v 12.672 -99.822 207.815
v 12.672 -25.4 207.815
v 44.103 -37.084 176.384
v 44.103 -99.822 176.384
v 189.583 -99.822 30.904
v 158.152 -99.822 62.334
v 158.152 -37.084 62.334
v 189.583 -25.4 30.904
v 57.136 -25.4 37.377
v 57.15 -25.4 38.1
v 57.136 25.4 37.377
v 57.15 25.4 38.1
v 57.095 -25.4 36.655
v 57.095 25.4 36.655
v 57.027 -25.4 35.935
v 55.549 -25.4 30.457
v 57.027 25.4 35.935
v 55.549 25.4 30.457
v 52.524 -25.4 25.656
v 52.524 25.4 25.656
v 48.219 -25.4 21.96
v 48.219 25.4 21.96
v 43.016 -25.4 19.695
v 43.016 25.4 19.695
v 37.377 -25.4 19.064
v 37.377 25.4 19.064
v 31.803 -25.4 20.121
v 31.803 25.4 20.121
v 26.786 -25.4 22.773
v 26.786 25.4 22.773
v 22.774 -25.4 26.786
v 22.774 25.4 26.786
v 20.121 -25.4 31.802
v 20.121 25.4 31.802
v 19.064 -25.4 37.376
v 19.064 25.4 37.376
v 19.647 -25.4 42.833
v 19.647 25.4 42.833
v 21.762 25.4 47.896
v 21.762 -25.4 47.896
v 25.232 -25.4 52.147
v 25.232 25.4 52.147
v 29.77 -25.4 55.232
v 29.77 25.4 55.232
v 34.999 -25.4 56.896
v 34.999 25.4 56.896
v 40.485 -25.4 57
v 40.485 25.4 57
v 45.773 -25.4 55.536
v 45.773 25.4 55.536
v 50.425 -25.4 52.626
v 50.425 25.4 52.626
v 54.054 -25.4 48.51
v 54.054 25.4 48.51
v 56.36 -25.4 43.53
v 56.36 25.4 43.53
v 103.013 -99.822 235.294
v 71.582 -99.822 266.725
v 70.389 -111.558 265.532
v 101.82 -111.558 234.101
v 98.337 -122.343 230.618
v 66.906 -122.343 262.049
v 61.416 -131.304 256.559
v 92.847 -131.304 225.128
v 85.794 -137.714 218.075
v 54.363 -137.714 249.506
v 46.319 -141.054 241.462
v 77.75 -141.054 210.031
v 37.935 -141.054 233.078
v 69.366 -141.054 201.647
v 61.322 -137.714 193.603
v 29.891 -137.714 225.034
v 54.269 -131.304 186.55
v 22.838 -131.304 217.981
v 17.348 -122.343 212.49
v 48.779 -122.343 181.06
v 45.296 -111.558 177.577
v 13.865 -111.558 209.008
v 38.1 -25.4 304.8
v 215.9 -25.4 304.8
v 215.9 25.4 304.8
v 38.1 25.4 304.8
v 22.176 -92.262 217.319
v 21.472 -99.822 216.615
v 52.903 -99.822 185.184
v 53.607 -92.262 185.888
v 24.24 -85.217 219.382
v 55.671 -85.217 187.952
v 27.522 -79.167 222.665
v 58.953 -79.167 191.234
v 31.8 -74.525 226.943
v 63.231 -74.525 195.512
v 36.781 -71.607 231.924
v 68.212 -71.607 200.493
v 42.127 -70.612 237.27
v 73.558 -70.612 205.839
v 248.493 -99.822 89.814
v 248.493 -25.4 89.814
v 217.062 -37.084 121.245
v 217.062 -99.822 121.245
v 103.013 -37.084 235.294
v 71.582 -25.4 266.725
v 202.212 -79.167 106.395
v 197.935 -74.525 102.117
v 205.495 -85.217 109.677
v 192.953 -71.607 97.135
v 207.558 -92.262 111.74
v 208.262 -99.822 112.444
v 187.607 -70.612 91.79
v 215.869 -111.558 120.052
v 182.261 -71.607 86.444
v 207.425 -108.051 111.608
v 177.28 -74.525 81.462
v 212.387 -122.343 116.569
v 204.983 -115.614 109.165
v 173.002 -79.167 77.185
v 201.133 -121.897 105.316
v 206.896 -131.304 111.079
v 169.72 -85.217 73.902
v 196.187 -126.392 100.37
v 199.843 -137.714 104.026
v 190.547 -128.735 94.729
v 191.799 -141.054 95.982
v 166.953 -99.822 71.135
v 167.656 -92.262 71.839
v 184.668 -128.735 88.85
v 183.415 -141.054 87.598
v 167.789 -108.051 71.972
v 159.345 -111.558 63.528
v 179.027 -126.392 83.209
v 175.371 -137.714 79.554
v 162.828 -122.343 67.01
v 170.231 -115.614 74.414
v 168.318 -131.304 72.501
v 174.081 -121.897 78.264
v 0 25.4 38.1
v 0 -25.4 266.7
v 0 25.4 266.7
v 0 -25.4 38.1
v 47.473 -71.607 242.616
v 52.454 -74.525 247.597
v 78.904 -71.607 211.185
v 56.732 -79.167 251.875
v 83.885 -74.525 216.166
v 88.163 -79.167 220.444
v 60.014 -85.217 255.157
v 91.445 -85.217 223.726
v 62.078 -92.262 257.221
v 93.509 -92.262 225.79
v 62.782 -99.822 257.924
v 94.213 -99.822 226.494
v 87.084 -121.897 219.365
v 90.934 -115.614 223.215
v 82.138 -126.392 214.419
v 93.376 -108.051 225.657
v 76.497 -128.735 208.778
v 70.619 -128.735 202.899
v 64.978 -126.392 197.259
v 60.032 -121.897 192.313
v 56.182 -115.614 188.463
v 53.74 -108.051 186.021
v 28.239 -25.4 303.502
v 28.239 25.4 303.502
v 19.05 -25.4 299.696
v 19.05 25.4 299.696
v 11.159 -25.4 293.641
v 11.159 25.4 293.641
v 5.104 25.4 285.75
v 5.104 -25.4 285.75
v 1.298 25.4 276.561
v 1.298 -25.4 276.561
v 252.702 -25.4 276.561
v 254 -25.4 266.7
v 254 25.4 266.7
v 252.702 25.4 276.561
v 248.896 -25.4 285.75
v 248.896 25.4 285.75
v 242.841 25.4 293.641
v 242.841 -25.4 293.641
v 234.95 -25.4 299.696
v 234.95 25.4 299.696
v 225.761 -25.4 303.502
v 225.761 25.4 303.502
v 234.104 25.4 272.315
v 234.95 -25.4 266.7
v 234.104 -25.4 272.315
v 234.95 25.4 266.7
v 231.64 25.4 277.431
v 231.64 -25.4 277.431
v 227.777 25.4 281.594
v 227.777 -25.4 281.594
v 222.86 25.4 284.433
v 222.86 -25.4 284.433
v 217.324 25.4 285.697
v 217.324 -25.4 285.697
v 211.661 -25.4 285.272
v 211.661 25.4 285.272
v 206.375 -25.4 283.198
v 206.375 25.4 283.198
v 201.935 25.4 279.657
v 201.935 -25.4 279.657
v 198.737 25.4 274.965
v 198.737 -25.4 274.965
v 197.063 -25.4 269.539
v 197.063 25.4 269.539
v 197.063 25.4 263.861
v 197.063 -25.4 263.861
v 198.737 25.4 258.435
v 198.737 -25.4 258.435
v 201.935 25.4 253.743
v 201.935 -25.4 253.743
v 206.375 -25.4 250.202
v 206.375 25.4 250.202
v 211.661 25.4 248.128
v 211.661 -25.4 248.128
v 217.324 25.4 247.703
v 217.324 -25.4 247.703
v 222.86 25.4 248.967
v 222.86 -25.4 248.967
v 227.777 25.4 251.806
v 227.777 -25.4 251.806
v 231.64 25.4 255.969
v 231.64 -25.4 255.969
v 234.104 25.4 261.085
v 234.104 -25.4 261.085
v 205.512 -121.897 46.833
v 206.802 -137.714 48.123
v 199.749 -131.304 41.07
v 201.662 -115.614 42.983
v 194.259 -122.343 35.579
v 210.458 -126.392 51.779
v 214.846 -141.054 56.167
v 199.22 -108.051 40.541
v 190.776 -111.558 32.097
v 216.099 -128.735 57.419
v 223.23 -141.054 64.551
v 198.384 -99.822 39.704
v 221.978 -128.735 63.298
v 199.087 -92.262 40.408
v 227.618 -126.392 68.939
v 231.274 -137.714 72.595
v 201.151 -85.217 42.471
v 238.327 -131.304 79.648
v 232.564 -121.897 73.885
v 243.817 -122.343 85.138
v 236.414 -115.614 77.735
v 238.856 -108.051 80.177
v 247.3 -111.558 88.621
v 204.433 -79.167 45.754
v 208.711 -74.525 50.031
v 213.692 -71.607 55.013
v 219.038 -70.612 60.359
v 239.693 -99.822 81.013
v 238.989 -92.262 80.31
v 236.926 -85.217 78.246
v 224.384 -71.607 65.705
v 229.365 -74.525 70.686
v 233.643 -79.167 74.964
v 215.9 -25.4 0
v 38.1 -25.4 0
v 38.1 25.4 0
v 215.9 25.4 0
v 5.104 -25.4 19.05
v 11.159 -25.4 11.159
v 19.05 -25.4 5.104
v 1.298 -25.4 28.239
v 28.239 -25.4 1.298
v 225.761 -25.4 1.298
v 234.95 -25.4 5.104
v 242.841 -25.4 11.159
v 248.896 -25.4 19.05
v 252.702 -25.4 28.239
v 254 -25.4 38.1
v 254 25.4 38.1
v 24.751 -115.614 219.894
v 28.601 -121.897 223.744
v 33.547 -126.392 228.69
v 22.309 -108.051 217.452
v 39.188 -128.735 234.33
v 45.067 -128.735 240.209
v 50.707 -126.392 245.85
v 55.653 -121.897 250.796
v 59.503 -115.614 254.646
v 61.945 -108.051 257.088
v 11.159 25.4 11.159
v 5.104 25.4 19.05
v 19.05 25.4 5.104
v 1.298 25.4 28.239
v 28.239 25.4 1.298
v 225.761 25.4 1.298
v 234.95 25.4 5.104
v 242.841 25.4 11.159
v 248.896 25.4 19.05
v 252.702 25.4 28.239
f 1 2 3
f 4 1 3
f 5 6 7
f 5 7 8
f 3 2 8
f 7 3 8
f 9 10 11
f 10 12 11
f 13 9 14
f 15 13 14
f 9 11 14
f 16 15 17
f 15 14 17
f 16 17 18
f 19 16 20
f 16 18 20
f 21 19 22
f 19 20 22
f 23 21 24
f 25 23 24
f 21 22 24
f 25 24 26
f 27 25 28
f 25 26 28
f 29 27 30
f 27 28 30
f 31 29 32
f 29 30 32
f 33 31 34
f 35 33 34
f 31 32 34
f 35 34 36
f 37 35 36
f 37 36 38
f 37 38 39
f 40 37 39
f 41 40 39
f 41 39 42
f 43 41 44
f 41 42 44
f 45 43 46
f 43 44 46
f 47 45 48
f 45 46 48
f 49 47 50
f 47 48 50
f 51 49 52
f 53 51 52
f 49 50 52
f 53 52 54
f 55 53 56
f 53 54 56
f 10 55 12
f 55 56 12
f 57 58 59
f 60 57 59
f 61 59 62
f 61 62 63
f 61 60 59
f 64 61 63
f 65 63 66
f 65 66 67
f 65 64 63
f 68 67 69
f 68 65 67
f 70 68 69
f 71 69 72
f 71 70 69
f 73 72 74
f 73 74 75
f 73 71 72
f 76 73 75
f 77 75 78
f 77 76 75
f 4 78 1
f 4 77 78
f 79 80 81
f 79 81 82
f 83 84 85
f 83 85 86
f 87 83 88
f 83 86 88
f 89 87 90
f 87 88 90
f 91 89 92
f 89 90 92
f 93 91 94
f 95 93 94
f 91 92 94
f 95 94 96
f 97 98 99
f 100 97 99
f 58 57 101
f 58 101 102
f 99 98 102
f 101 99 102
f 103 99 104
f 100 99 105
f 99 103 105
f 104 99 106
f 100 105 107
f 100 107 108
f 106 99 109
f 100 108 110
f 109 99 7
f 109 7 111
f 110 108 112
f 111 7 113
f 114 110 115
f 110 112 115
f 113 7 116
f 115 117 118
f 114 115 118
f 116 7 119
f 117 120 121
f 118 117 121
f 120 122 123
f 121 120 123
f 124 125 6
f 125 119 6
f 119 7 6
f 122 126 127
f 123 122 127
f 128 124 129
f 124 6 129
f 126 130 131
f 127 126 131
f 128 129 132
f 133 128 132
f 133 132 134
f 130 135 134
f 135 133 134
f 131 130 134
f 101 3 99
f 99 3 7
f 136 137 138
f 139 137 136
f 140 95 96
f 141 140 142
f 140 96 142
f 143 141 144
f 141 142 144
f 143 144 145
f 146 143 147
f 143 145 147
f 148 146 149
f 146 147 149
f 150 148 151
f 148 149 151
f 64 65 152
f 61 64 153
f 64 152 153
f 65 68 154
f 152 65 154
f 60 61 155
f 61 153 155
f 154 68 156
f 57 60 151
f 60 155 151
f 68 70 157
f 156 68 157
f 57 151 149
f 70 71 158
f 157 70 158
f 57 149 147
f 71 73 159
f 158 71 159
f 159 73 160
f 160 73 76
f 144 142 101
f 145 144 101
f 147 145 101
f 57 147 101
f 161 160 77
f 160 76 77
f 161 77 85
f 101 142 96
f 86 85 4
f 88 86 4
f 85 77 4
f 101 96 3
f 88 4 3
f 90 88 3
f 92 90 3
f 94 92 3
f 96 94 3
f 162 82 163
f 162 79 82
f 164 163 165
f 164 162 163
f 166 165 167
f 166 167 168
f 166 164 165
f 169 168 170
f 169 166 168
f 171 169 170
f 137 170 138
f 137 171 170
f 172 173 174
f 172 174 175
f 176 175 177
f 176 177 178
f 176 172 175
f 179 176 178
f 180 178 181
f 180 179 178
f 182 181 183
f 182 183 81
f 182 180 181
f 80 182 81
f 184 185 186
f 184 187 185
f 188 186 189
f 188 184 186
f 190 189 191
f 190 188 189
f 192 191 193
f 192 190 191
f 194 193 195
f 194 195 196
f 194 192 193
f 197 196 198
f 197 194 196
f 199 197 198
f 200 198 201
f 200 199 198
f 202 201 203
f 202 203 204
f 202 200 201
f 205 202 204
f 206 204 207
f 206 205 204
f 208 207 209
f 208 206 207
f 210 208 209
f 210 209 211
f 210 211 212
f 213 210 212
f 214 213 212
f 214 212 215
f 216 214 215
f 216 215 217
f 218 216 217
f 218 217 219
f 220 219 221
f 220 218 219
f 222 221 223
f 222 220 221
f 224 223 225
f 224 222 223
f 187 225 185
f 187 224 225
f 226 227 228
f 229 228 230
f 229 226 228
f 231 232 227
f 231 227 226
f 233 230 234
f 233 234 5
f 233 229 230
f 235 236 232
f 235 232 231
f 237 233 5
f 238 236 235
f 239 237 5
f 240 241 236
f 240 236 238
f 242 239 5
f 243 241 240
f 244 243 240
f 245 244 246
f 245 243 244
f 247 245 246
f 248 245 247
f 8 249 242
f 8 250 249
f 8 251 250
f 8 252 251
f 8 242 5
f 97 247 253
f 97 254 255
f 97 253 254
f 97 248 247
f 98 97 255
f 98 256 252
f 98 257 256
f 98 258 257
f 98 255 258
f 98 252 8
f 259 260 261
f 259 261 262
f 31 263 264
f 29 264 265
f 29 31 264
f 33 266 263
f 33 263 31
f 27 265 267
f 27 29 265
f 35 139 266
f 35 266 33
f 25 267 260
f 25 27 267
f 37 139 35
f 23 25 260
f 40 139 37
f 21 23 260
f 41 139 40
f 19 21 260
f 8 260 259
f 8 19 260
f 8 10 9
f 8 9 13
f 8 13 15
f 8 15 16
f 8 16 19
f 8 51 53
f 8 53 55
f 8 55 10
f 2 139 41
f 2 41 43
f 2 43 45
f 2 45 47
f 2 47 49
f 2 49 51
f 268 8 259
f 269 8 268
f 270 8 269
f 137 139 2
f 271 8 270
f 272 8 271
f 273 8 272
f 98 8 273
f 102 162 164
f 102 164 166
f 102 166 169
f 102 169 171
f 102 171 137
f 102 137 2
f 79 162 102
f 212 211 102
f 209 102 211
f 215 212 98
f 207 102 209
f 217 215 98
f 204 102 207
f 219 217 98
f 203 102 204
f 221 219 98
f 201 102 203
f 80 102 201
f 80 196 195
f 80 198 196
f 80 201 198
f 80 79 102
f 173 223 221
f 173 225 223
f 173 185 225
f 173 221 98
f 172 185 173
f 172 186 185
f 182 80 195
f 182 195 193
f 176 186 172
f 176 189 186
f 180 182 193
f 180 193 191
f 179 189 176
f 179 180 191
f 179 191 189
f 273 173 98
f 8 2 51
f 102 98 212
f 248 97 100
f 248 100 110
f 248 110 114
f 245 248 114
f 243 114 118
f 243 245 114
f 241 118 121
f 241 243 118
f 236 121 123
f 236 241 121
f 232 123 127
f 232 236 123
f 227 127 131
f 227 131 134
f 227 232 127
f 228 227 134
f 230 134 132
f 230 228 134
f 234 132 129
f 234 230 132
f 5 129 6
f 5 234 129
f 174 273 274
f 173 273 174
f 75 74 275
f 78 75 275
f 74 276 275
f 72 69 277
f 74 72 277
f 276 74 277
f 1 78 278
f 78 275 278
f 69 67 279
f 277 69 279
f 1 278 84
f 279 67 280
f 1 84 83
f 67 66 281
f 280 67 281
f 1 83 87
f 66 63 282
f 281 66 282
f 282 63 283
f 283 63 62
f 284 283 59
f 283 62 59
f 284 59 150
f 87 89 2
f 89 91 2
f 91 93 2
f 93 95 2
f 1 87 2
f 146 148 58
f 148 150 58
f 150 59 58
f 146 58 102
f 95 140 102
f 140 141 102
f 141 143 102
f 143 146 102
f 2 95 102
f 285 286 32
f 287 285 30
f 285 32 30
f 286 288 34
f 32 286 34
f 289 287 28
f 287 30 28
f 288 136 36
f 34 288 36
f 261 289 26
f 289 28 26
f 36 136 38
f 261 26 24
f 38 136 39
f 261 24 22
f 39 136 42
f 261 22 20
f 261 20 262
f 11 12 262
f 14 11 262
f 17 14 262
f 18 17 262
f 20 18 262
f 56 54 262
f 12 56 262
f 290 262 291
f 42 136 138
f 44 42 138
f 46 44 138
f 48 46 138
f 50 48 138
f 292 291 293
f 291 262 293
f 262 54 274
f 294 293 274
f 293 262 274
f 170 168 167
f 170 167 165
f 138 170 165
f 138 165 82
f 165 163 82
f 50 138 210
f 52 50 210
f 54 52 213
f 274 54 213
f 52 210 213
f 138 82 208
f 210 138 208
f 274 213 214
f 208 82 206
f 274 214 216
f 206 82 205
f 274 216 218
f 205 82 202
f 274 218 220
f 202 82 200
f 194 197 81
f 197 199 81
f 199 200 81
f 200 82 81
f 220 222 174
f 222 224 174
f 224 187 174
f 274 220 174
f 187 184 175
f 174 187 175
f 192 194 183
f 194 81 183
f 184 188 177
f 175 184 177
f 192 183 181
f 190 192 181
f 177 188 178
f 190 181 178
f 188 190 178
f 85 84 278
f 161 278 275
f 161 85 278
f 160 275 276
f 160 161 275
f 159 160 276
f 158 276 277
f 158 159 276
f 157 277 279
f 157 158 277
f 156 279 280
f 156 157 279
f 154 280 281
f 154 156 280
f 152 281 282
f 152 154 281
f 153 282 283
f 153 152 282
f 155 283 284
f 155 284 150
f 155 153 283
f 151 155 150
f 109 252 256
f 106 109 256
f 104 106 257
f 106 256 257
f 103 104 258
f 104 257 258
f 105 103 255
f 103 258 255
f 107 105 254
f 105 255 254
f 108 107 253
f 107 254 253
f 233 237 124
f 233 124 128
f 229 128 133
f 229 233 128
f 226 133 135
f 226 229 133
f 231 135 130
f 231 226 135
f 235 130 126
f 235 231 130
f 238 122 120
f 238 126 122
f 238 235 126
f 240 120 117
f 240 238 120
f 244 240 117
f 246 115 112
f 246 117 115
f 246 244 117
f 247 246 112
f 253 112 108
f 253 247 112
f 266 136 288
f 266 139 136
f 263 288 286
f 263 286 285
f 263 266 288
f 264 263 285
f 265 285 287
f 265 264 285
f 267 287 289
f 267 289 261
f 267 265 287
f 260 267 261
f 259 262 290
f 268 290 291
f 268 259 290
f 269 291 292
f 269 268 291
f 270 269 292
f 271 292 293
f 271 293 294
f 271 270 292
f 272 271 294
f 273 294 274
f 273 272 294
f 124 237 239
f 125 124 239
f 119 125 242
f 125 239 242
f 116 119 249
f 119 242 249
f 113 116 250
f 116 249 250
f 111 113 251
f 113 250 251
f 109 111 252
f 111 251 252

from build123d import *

# Parameters (mm, degrees)
F0_R     = 19.05
F1_DEPTH = 25.4
F2_DEPTH = 99.822
F4_DEPTH = 250.19
F5_DEPTH = 250.19
F6_W     = 161.29
F6_H     = 62.738
F6_H_2   = 49.2019202976
F7_DEPTH = 171.704


# Not quite as in the source:
# - a feature names something its author has since deleted; it is built from what else it names


with BuildPart() as f1:
    # F0 (on Front) → F1 (new body, symmetric)
    with BuildSketch(Plane.XZ):
        with BuildLine():
            ThreePointArc((0, 38.1), (11.1592316368, 11.1592316368), (38.1, 0))
            Line((38.1, 0), (215.9, 0))
            ThreePointArc((215.9, 0), (242.8407683632, 11.1592316368), (254, 38.1))
            Line((254, 38.1), (254, 266.7))
            ThreePointArc((254, 266.7), (242.8407683632, 293.6407683632), (215.9, 304.8))
            Line((215.9, 304.8), (38.1, 304.8))
            ThreePointArc((38.1, 304.8), (11.1592316368, 293.6407683632), (0, 266.7))
            Line((0, 266.7), (0, 38.1))
        make_face()
        with BuildLine():
            ThreePointArc((57.0266099035, 35.9352973504), (37.3773915988, 19.0637099965), (19.0637495923, 37.376349246))
            ThreePointArc((19.0637495923, 37.376349246), (37.7381093173, 57.1465622918), (57.15, 38.1))
            ThreePointArc((57.15, 38.1), (57.1191274598, 37.0158917631), (57.0266099035, 35.9352973504))
        make_face(mode=Mode.SUBTRACT)
        Polygon((248.4933634432, 89.814005202), (189.582883289, 30.9035250478), (12.671837704, 207.8145706329), (71.5823178582, 266.7250507871), align=None, mode=Mode.SUBTRACT)
        with Locations((215.9, 266.7)):
            Circle(F0_R, mode=Mode.SUBTRACT)
        Polygon((12.671837704, 207.8145706329), (189.582883289, 30.9035250478), (248.4933634432, 89.814005202), (71.5823178582, 266.7250507871), align=None)
    extrude(amount=F1_DEPTH, both=True)

    # F0 (on Front) → F2 (join)
    with BuildSketch(Plane.XZ):
        Polygon((12.671837704, 207.8145706329), (189.582883289, 30.9035250478), (248.4933634432, 89.814005202), (71.5823178582, 266.7250507871), align=None)
    extrude(amount=F2_DEPTH)

    # F3 (on face) → F4 (join)
    with BuildSketch(Plane(origin=(79.3396791206, 0, -79.3396791206), x_dir=(0, 1, 0), z_dir=(0.7071067812, 0, -0.7071067812))):
        with BuildLine():
            ThreePointArc((-99.822, 168.3534344944), (-129.032, 197.5634344944), (-99.822, 226.7734344944))
            Line((-99.822, 226.7734344944), (-99.822, 239.2194344944))
            ThreePointArc((-99.822, 239.2194344944), (-141.478, 197.5634344944), (-99.822, 155.9074344944))
            Line((-99.822, 155.9074344944), (-99.822, 168.3534344944))
        make_face()
    extrude(amount=-F4_DEPTH)

    # F3 (on face) → F5 (cut)
    with BuildSketch(Plane(origin=(79.3396791206, 0, -79.3396791206), x_dir=(0, 1, 0), z_dir=(0.7071067812, 0, -0.7071067812))):
        with BuildLine():
            ThreePointArc((-99.822, 168.3534344944), (-79.1674109215, 176.908845416), (-70.612, 197.5634344944))
            ThreePointArc((-70.612, 197.5634344944), (-79.1674109215, 218.2180235729), (-99.822, 226.7734344944))
            Line((-99.822, 226.7734344944), (-99.822, 168.3534344944))
        make_face()
    extrude(amount=-F5_DEPTH, mode=Mode.SUBTRACT)

    # F6 (on face) → F7 (cut)
    with BuildSketch(Plane(origin=(110.2432041684, 0, 110.2432041684), x_dir=(0.7071067812, 0, -0.7071067812), z_dir=(-0.7071067812, 0, -0.7071067812))):
        with Locations((-12.8917497533, 68.453)):
            Rectangle(F6_W, F6_H)
        with Locations((-12.8917497533, 124.4229601488)):
            Rectangle(F6_W, F6_H_2)
    extrude(amount=-F7_DEPTH, mode=Mode.SUBTRACT)


solid = f1.part
